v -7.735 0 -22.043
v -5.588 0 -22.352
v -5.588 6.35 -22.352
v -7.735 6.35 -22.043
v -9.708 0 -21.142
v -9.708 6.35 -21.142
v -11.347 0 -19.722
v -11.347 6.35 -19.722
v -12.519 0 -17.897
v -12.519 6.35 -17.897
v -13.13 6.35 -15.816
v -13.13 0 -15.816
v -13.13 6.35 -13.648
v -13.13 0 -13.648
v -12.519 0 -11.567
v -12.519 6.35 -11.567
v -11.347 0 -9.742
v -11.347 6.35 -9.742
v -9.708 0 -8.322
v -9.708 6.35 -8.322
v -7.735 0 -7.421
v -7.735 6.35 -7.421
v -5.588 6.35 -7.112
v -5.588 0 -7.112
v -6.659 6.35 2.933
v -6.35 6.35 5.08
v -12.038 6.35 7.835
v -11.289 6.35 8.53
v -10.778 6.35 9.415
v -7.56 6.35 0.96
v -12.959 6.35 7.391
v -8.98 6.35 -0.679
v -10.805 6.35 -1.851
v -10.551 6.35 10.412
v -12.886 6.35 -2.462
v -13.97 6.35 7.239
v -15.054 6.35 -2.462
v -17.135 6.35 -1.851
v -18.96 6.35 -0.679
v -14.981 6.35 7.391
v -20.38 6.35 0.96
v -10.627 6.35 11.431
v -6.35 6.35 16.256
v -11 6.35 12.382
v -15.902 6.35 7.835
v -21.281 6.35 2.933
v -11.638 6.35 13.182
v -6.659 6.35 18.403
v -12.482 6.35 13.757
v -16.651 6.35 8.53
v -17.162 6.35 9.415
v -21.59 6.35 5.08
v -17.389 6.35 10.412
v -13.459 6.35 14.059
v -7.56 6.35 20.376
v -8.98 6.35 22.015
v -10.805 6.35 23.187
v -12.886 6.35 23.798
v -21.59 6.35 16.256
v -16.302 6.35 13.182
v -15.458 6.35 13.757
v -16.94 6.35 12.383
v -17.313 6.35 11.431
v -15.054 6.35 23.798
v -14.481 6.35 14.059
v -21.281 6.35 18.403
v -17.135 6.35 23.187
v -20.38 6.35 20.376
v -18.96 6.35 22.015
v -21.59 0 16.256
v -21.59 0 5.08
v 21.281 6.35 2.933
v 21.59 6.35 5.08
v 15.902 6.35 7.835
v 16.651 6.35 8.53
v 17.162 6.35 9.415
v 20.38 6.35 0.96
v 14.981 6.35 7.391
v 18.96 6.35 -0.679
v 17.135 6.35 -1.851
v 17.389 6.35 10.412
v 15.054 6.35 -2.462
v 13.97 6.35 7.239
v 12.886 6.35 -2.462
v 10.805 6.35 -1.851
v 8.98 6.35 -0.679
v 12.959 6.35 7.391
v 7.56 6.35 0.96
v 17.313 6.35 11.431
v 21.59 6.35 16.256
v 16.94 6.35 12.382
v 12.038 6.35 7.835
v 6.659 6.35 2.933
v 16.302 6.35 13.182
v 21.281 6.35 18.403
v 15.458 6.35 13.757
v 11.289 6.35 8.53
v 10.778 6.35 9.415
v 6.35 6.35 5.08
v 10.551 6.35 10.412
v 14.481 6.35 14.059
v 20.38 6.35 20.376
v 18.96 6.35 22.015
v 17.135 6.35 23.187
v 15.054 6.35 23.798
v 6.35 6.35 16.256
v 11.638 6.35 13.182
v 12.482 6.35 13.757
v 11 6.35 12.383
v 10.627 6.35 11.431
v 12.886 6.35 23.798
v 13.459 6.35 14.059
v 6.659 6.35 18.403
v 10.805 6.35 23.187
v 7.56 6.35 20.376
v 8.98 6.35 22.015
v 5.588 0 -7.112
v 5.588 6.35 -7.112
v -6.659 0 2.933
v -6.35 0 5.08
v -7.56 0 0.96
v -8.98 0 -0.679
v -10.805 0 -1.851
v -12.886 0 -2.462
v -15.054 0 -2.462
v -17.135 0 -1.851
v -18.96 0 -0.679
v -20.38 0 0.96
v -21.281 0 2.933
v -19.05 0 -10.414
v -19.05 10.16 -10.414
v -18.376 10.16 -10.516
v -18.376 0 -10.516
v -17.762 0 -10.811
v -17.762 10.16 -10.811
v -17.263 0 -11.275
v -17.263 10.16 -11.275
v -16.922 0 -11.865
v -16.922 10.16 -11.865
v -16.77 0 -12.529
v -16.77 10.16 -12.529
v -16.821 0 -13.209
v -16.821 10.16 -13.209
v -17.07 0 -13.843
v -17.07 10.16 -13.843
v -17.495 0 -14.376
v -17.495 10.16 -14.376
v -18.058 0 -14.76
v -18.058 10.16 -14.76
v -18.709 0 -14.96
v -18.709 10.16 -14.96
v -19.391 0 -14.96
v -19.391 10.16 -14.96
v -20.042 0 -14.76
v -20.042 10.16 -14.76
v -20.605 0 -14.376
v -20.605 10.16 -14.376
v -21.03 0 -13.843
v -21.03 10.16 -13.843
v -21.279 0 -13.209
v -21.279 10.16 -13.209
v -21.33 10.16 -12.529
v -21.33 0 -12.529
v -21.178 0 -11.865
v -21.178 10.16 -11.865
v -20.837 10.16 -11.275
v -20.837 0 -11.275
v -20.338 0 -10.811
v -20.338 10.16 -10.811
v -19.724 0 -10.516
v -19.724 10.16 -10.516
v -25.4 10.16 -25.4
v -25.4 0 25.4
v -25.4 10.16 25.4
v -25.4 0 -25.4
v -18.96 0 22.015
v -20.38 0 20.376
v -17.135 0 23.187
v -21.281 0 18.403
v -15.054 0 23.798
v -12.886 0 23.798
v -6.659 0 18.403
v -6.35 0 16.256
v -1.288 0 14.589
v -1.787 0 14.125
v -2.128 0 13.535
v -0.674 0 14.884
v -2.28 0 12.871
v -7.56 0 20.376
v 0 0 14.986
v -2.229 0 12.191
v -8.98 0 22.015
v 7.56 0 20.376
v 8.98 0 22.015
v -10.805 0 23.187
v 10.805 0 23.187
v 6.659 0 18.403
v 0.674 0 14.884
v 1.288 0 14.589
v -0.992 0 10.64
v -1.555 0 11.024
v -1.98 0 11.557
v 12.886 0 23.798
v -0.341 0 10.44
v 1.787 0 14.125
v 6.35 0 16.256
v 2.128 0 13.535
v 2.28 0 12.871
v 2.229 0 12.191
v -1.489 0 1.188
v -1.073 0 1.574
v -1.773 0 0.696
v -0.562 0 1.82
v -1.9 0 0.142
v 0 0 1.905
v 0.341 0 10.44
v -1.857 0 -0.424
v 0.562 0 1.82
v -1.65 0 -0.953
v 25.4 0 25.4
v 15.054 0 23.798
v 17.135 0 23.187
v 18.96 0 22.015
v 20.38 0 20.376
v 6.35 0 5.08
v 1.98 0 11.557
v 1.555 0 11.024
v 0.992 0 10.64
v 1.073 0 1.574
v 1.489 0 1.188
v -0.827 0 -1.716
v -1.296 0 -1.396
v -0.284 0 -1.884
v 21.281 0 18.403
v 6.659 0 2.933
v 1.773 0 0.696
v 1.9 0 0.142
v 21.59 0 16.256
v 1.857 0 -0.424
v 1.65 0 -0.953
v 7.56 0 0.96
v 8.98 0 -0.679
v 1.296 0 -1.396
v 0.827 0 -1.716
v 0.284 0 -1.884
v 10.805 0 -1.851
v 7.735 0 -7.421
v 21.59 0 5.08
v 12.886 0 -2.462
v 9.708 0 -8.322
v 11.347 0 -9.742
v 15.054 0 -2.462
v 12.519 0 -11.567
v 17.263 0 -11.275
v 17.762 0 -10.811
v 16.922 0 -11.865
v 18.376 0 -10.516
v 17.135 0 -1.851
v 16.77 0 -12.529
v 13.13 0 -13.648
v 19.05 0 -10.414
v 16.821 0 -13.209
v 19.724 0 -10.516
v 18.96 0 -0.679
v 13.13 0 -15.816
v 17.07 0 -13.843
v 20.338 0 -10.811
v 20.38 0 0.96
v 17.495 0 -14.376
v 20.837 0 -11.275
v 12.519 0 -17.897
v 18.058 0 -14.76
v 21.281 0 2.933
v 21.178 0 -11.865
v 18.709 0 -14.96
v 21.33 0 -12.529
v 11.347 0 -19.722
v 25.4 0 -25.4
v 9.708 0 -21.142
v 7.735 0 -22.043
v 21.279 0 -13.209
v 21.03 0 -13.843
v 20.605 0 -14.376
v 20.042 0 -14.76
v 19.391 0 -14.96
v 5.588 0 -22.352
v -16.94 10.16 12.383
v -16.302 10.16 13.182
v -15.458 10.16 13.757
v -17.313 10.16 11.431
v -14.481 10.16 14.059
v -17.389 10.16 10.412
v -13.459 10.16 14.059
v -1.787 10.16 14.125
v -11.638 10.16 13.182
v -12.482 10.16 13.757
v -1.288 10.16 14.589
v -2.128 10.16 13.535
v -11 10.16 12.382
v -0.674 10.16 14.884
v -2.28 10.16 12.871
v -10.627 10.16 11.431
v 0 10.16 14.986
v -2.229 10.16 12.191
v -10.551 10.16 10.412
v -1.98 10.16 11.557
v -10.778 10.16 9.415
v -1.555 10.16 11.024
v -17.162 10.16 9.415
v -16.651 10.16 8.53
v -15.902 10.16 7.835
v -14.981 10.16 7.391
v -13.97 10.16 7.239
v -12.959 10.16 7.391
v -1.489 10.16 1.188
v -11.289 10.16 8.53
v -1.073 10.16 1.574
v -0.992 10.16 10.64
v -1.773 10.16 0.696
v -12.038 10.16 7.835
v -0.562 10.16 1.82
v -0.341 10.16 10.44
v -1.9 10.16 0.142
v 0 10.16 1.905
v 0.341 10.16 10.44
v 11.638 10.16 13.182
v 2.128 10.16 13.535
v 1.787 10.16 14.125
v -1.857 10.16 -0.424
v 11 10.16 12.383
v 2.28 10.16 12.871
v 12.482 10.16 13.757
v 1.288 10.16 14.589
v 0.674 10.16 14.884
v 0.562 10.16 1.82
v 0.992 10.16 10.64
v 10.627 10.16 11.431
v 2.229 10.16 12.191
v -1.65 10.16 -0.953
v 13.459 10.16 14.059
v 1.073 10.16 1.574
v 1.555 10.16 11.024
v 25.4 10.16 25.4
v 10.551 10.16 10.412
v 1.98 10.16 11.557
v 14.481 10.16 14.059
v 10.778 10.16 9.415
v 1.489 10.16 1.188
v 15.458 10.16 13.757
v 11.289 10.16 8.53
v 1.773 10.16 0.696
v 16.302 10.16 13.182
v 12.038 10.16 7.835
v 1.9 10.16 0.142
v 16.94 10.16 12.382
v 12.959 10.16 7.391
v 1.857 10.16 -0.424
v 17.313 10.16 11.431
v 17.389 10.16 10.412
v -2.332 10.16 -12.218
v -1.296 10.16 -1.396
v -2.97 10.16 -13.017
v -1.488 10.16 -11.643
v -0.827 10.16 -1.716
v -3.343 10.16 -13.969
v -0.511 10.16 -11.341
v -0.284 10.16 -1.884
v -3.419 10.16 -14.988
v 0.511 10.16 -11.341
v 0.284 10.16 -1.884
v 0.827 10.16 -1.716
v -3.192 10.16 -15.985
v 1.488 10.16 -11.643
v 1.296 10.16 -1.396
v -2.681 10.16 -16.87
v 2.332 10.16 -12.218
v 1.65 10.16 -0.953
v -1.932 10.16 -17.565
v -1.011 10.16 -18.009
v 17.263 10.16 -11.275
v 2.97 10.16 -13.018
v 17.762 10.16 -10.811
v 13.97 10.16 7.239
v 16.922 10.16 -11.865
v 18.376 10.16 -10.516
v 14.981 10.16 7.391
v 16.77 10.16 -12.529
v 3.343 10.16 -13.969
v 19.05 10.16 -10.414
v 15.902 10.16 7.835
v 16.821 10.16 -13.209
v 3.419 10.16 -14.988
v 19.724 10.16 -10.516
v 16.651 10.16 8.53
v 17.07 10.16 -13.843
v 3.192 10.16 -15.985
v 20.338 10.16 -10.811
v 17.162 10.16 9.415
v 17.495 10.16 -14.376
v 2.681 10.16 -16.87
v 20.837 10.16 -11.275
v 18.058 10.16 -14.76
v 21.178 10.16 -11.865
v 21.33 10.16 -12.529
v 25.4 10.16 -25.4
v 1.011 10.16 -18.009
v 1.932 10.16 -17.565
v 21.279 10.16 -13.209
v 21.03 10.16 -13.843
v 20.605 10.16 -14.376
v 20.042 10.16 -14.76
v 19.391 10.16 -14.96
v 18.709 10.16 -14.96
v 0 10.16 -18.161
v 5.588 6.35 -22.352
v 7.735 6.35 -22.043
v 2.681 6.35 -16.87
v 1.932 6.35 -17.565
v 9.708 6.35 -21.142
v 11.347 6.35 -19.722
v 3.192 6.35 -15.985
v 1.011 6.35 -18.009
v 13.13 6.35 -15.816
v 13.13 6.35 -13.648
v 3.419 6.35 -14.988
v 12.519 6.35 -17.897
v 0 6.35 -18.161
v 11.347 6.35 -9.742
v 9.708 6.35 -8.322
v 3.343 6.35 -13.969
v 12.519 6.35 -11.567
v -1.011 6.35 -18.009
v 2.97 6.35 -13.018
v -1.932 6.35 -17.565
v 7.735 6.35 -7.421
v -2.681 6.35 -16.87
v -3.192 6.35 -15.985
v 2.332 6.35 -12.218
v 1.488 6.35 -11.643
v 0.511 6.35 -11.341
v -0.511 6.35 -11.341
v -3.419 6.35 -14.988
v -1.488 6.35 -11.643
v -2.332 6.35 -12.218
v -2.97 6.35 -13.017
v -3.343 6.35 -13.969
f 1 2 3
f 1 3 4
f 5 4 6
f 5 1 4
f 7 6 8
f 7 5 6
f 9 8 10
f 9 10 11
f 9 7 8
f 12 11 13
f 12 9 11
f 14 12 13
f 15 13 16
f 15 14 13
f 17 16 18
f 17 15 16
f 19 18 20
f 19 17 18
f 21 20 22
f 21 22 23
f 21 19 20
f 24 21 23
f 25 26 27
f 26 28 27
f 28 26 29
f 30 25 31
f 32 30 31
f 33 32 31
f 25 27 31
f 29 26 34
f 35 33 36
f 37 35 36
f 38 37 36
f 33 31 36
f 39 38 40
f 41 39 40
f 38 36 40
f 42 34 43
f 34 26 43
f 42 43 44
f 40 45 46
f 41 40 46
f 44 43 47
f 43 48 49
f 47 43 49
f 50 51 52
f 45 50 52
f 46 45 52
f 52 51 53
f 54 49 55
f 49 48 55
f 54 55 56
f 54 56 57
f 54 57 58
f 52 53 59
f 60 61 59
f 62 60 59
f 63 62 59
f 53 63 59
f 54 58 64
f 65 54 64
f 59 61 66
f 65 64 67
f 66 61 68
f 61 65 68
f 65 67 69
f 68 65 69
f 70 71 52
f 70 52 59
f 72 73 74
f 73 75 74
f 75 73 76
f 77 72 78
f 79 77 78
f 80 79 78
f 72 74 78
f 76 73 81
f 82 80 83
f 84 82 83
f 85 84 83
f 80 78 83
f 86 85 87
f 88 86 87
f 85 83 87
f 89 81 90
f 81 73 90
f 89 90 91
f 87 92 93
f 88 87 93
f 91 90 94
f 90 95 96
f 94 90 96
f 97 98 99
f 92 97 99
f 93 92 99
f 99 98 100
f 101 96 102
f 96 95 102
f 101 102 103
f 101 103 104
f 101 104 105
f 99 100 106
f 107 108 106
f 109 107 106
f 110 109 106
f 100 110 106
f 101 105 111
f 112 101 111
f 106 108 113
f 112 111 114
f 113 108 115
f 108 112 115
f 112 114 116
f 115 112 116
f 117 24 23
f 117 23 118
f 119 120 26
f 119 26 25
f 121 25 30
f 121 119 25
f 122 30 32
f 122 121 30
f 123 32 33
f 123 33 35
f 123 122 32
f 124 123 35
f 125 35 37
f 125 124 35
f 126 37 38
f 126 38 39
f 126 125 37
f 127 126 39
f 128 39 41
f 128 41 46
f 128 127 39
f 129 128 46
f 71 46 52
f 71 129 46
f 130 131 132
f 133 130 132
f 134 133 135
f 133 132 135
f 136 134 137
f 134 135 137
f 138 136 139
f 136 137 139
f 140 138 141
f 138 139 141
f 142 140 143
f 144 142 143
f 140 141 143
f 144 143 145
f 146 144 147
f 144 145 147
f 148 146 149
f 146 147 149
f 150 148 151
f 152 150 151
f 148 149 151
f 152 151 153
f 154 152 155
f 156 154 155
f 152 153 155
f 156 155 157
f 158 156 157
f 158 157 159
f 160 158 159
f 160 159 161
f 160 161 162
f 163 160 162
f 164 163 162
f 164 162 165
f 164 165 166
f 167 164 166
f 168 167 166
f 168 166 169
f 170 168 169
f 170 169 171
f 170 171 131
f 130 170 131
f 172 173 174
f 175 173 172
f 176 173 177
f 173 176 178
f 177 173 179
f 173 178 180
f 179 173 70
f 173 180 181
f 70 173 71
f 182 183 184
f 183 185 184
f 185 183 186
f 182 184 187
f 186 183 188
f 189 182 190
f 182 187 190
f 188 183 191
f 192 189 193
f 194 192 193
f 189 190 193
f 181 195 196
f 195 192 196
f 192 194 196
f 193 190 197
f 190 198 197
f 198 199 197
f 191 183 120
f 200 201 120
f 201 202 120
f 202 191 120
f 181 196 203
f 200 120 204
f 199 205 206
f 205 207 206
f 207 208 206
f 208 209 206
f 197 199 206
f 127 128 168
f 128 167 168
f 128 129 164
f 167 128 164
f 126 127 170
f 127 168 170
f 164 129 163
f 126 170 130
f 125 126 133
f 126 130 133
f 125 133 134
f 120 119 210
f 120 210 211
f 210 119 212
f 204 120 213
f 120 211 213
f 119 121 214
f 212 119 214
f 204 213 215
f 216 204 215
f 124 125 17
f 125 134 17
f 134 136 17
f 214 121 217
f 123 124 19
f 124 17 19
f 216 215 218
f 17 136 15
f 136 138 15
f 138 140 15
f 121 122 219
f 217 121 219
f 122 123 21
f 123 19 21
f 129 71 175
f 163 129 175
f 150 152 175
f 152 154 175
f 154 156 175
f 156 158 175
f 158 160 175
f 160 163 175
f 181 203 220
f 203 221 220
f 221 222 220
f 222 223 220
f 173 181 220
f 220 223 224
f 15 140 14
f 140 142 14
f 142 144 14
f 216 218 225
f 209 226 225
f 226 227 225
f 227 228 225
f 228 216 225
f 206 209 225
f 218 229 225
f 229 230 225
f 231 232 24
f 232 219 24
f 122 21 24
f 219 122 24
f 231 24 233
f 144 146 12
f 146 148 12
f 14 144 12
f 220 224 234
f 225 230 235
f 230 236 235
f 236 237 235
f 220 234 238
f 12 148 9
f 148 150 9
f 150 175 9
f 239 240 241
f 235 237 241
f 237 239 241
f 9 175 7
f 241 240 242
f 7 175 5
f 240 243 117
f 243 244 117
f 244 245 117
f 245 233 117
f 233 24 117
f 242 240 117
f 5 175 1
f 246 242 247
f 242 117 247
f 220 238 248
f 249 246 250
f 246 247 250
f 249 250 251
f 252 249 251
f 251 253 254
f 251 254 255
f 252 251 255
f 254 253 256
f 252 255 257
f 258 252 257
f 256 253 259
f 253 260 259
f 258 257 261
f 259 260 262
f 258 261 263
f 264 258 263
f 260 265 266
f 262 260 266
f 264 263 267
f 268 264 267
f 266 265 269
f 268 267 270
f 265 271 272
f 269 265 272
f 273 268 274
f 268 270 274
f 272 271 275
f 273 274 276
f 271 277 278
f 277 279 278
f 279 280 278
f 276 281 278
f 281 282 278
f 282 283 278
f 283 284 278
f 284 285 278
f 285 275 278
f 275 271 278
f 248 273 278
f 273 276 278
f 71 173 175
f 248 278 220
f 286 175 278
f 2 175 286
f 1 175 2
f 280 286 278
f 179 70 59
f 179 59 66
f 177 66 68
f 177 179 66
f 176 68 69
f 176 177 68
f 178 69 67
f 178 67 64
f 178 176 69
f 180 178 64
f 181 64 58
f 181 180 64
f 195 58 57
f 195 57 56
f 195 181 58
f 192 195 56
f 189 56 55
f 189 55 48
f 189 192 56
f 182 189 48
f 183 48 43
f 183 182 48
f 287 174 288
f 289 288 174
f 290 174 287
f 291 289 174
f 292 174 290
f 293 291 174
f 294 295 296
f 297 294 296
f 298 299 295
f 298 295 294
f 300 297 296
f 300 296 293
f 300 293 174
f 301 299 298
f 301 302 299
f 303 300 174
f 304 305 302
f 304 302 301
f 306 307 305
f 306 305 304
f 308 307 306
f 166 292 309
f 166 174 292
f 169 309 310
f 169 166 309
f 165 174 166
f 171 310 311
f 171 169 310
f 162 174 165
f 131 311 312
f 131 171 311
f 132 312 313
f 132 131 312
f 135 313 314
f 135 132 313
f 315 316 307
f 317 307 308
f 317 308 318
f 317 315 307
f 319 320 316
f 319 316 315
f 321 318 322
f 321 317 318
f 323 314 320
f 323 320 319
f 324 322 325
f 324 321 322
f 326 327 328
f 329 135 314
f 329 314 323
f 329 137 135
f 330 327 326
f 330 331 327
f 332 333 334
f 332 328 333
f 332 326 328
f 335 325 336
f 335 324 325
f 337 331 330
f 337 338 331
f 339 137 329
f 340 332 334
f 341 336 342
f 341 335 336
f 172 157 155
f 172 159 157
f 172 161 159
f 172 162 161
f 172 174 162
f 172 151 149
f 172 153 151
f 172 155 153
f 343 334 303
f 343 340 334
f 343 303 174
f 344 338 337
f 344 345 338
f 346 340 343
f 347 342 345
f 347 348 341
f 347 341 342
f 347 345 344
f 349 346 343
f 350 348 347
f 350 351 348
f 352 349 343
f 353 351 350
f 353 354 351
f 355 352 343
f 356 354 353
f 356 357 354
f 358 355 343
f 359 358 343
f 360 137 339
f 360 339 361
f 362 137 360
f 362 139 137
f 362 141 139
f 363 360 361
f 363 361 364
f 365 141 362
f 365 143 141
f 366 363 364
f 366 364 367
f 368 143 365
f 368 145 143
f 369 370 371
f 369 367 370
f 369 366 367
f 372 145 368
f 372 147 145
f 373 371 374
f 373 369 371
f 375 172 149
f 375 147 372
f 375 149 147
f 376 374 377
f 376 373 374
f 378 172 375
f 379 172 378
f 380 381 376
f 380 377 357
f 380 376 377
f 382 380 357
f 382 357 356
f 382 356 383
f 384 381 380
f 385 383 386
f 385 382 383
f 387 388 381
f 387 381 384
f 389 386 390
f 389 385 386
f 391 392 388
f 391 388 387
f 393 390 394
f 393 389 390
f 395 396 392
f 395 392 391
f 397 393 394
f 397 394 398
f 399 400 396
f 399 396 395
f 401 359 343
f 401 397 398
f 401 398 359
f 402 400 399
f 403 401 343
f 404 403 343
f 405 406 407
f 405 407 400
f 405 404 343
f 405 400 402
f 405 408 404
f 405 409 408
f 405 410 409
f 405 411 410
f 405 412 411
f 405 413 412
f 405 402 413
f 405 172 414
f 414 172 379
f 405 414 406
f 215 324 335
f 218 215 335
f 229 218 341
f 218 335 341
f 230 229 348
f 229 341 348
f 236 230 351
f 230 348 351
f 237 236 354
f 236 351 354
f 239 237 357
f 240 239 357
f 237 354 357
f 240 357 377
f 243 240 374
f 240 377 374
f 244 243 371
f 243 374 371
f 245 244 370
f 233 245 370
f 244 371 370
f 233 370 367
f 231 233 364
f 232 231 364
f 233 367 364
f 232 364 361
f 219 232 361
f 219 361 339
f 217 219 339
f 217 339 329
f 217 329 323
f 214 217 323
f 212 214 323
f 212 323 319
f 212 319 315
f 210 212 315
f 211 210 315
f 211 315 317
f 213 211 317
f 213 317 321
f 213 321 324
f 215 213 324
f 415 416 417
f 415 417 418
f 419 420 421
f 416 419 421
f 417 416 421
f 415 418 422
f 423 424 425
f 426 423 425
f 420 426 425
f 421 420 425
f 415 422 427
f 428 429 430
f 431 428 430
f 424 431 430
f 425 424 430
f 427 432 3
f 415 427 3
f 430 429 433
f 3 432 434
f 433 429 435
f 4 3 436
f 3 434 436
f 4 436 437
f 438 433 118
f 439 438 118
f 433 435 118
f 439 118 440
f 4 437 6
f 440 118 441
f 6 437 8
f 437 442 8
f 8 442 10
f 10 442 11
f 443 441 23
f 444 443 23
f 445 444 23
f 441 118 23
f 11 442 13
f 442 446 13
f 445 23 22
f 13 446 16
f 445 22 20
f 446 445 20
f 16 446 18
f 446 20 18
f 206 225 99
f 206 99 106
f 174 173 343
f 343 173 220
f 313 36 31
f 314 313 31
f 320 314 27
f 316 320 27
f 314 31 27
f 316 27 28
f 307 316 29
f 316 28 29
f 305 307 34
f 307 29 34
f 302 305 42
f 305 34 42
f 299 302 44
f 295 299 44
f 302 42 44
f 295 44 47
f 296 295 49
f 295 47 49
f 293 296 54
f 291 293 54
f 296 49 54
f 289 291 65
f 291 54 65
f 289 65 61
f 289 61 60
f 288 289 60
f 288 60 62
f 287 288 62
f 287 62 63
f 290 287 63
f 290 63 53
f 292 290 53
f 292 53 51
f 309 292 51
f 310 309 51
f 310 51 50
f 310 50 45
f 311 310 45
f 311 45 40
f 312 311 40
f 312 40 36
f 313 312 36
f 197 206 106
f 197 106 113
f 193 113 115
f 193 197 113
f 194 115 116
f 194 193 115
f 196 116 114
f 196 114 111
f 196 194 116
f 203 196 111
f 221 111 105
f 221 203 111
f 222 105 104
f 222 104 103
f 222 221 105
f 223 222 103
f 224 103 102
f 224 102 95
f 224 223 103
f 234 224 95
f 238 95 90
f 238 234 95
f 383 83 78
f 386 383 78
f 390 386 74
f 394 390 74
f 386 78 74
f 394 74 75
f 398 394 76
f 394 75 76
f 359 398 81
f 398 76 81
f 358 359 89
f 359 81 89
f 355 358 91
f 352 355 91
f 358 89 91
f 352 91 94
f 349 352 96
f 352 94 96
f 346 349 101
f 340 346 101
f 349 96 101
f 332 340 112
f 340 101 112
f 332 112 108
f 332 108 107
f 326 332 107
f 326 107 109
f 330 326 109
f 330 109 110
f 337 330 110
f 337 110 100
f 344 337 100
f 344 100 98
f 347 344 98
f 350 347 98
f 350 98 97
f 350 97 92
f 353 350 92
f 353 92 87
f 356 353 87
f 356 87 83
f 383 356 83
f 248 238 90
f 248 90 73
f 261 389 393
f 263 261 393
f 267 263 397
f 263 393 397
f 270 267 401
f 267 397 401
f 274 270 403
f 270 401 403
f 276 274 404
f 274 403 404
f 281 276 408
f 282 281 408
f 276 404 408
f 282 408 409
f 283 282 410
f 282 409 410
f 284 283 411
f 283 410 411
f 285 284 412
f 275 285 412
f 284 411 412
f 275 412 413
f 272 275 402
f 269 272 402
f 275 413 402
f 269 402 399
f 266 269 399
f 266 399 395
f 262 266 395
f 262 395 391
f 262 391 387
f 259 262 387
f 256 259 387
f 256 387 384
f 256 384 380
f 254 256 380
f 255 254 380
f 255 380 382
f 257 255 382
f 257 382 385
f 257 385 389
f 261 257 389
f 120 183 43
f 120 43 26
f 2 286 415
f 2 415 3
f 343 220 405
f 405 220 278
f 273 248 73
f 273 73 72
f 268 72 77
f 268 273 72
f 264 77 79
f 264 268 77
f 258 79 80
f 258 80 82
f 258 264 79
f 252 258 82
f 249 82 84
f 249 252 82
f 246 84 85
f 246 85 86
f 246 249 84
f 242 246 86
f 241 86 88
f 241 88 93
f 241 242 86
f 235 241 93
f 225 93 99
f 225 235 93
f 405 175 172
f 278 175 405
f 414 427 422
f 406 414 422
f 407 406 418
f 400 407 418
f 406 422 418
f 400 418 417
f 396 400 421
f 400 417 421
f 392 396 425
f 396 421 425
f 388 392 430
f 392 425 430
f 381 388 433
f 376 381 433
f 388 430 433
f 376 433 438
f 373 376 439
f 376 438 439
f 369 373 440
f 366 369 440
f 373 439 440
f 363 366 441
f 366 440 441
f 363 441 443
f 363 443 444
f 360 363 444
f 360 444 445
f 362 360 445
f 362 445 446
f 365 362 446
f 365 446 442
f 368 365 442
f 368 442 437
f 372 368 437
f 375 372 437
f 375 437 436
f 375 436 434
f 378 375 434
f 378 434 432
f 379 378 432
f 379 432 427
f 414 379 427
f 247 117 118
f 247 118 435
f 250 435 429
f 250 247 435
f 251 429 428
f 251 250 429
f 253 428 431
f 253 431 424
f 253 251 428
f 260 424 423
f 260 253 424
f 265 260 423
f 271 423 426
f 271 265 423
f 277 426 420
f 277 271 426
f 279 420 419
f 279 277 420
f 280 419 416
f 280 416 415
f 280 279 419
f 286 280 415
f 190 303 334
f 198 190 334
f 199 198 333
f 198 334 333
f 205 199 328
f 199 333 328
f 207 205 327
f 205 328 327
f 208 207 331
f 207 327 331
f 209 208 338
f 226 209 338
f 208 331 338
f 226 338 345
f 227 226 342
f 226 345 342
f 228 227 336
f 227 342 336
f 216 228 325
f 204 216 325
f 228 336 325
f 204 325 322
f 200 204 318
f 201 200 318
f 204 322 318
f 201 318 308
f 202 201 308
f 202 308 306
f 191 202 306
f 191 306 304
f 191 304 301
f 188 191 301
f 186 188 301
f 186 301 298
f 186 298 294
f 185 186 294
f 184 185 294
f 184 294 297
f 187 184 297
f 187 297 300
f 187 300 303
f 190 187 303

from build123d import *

# Parameters (mm, degrees)
SKETCH1_W           = 50.8
SKETCH1_H           = 50.8
BOSS_EXTRUDE1_DEPTH = 10.16
SKETCH2_R           = 2.286
CUT_EXTRUDE1_DEPTH  = 38.33022368
SKETCH3_R           = 3.429
CUT_EXTRUDE2_DEPTH  = 6.35
SKETCH4_R           = 3.429
CUT_EXTRUDE3_DEPTH  = 38.33022368
SKETCH5_R           = 1.905
CUT_EXTRUDE5_DEPTH  = 38.33022368


with BuildPart() as part:
    # Sketch1 → Boss-Extrude1 (new body)
    with BuildSketch(Plane(origin=(0, 0, 0), x_dir=(1, 0, 0), z_dir=(0, 1, 0))):
        Rectangle(SKETCH1_W, SKETCH1_H)
    extrude(amount=BOSS_EXTRUDE1_DEPTH)

    # Sketch2 → Cut-Extrude1 (cut, through all)
    with BuildSketch(Plane(origin=(0, 10.16, 0), x_dir=(1, 0, 0), z_dir=(0, 1, 0))):
        with Locations(Location((-19.05, 12.7, 0), (0, 0, 270))):
            Circle(SKETCH2_R)
        with Locations(Location((19.05, 12.7, 0), (0, 0, 270))):
            Circle(SKETCH2_R)
        with Locations(Location((0, -12.7, 0), (0, 0, 270))):
            Circle(SKETCH2_R)
    extrude(amount=-CUT_EXTRUDE1_DEPTH, mode=Mode.SUBTRACT)

    # Sketch3 → Cut-Extrude2 (cut)
    # profile 1 of 3: a face of its own
    with BuildSketch(Plane.XZ):
        with BuildLine():
            Line((-6.35, 16.256), (-6.35, 5.08))
            ThreePointArc((-6.35, 5.08), (-13.97, -2.54), (-21.59, 5.08))
            Line((-21.59, 5.08), (-21.59, 16.256))
            ThreePointArc((-21.59, 16.256), (-13.97, 23.876), (-6.35, 16.256))
        make_face()
        with Locations(Location((-13.97, 10.668, 0), (0, 0, 270))):
            Circle(SKETCH3_R, mode=Mode.SUBTRACT)
    # profile 2 of 3: a face of its own
    with BuildSketch(Plane.XZ):
        with BuildLine():
            Line((21.59, 16.256), (21.59, 5.08))
            ThreePointArc((21.59, 5.08), (13.97, -2.54), (6.35, 5.08))
            Line((6.35, 5.08), (6.35, 16.256))
            ThreePointArc((6.35, 16.256), (13.97, 23.876), (21.59, 16.256))
        make_face()
        with Locations(Location((13.97, 10.668, 0), (0, 0, 270))):
            Circle(SKETCH3_R, mode=Mode.SUBTRACT)
    # profile 3 of 3: a face of its own
    with BuildSketch(Plane.XZ):
        with BuildLine():
            Line((-5.588, -7.112), (5.588, -7.112))
            ThreePointArc((5.588, -7.112), (13.208, -14.732), (5.588, -22.352))
            Line((5.588, -22.352), (-5.588, -22.352))
            ThreePointArc((-5.588, -22.352), (-13.208, -14.732), (-5.588, -7.112))
        make_face()
        with Locations(Location((0, -14.732, 0), (0, 0, 270))):
            Circle(SKETCH3_R, mode=Mode.SUBTRACT)
    extrude(amount=-CUT_EXTRUDE2_DEPTH, mode=Mode.SUBTRACT)

    # Sketch4 → Cut-Extrude3 (cut, through all)
    with BuildSketch(Plane(origin=(0, 0, 0), x_dir=(-1, 0, 0), z_dir=(0, -1, 0))):
        with Locations(Location((13.97, -10.668, 0), (0, 0, 90))):
            Circle(SKETCH4_R)
        with Locations(Location((-13.97, -10.668, 0), (0, 0, 90))):
            Circle(SKETCH4_R)
        with Locations(Location((0, 14.732, 0), (0, 0, 90))):
            Circle(SKETCH4_R)
    extrude(amount=-CUT_EXTRUDE3_DEPTH, mode=Mode.SUBTRACT)

    # Sketch5 → Cut-Extrude5 (cut, through all)
    with BuildSketch(Plane(origin=(0, 10.16, 0), x_dir=(1, 0, 0), z_dir=(0, 1, 0))):
        with Locations(Location((0, 0, 0), (0, 0, 270))):
            Circle(SKETCH5_R)
    extrude(amount=-CUT_EXTRUDE5_DEPTH, mode=Mode.SUBTRACT)


solid = part.part
